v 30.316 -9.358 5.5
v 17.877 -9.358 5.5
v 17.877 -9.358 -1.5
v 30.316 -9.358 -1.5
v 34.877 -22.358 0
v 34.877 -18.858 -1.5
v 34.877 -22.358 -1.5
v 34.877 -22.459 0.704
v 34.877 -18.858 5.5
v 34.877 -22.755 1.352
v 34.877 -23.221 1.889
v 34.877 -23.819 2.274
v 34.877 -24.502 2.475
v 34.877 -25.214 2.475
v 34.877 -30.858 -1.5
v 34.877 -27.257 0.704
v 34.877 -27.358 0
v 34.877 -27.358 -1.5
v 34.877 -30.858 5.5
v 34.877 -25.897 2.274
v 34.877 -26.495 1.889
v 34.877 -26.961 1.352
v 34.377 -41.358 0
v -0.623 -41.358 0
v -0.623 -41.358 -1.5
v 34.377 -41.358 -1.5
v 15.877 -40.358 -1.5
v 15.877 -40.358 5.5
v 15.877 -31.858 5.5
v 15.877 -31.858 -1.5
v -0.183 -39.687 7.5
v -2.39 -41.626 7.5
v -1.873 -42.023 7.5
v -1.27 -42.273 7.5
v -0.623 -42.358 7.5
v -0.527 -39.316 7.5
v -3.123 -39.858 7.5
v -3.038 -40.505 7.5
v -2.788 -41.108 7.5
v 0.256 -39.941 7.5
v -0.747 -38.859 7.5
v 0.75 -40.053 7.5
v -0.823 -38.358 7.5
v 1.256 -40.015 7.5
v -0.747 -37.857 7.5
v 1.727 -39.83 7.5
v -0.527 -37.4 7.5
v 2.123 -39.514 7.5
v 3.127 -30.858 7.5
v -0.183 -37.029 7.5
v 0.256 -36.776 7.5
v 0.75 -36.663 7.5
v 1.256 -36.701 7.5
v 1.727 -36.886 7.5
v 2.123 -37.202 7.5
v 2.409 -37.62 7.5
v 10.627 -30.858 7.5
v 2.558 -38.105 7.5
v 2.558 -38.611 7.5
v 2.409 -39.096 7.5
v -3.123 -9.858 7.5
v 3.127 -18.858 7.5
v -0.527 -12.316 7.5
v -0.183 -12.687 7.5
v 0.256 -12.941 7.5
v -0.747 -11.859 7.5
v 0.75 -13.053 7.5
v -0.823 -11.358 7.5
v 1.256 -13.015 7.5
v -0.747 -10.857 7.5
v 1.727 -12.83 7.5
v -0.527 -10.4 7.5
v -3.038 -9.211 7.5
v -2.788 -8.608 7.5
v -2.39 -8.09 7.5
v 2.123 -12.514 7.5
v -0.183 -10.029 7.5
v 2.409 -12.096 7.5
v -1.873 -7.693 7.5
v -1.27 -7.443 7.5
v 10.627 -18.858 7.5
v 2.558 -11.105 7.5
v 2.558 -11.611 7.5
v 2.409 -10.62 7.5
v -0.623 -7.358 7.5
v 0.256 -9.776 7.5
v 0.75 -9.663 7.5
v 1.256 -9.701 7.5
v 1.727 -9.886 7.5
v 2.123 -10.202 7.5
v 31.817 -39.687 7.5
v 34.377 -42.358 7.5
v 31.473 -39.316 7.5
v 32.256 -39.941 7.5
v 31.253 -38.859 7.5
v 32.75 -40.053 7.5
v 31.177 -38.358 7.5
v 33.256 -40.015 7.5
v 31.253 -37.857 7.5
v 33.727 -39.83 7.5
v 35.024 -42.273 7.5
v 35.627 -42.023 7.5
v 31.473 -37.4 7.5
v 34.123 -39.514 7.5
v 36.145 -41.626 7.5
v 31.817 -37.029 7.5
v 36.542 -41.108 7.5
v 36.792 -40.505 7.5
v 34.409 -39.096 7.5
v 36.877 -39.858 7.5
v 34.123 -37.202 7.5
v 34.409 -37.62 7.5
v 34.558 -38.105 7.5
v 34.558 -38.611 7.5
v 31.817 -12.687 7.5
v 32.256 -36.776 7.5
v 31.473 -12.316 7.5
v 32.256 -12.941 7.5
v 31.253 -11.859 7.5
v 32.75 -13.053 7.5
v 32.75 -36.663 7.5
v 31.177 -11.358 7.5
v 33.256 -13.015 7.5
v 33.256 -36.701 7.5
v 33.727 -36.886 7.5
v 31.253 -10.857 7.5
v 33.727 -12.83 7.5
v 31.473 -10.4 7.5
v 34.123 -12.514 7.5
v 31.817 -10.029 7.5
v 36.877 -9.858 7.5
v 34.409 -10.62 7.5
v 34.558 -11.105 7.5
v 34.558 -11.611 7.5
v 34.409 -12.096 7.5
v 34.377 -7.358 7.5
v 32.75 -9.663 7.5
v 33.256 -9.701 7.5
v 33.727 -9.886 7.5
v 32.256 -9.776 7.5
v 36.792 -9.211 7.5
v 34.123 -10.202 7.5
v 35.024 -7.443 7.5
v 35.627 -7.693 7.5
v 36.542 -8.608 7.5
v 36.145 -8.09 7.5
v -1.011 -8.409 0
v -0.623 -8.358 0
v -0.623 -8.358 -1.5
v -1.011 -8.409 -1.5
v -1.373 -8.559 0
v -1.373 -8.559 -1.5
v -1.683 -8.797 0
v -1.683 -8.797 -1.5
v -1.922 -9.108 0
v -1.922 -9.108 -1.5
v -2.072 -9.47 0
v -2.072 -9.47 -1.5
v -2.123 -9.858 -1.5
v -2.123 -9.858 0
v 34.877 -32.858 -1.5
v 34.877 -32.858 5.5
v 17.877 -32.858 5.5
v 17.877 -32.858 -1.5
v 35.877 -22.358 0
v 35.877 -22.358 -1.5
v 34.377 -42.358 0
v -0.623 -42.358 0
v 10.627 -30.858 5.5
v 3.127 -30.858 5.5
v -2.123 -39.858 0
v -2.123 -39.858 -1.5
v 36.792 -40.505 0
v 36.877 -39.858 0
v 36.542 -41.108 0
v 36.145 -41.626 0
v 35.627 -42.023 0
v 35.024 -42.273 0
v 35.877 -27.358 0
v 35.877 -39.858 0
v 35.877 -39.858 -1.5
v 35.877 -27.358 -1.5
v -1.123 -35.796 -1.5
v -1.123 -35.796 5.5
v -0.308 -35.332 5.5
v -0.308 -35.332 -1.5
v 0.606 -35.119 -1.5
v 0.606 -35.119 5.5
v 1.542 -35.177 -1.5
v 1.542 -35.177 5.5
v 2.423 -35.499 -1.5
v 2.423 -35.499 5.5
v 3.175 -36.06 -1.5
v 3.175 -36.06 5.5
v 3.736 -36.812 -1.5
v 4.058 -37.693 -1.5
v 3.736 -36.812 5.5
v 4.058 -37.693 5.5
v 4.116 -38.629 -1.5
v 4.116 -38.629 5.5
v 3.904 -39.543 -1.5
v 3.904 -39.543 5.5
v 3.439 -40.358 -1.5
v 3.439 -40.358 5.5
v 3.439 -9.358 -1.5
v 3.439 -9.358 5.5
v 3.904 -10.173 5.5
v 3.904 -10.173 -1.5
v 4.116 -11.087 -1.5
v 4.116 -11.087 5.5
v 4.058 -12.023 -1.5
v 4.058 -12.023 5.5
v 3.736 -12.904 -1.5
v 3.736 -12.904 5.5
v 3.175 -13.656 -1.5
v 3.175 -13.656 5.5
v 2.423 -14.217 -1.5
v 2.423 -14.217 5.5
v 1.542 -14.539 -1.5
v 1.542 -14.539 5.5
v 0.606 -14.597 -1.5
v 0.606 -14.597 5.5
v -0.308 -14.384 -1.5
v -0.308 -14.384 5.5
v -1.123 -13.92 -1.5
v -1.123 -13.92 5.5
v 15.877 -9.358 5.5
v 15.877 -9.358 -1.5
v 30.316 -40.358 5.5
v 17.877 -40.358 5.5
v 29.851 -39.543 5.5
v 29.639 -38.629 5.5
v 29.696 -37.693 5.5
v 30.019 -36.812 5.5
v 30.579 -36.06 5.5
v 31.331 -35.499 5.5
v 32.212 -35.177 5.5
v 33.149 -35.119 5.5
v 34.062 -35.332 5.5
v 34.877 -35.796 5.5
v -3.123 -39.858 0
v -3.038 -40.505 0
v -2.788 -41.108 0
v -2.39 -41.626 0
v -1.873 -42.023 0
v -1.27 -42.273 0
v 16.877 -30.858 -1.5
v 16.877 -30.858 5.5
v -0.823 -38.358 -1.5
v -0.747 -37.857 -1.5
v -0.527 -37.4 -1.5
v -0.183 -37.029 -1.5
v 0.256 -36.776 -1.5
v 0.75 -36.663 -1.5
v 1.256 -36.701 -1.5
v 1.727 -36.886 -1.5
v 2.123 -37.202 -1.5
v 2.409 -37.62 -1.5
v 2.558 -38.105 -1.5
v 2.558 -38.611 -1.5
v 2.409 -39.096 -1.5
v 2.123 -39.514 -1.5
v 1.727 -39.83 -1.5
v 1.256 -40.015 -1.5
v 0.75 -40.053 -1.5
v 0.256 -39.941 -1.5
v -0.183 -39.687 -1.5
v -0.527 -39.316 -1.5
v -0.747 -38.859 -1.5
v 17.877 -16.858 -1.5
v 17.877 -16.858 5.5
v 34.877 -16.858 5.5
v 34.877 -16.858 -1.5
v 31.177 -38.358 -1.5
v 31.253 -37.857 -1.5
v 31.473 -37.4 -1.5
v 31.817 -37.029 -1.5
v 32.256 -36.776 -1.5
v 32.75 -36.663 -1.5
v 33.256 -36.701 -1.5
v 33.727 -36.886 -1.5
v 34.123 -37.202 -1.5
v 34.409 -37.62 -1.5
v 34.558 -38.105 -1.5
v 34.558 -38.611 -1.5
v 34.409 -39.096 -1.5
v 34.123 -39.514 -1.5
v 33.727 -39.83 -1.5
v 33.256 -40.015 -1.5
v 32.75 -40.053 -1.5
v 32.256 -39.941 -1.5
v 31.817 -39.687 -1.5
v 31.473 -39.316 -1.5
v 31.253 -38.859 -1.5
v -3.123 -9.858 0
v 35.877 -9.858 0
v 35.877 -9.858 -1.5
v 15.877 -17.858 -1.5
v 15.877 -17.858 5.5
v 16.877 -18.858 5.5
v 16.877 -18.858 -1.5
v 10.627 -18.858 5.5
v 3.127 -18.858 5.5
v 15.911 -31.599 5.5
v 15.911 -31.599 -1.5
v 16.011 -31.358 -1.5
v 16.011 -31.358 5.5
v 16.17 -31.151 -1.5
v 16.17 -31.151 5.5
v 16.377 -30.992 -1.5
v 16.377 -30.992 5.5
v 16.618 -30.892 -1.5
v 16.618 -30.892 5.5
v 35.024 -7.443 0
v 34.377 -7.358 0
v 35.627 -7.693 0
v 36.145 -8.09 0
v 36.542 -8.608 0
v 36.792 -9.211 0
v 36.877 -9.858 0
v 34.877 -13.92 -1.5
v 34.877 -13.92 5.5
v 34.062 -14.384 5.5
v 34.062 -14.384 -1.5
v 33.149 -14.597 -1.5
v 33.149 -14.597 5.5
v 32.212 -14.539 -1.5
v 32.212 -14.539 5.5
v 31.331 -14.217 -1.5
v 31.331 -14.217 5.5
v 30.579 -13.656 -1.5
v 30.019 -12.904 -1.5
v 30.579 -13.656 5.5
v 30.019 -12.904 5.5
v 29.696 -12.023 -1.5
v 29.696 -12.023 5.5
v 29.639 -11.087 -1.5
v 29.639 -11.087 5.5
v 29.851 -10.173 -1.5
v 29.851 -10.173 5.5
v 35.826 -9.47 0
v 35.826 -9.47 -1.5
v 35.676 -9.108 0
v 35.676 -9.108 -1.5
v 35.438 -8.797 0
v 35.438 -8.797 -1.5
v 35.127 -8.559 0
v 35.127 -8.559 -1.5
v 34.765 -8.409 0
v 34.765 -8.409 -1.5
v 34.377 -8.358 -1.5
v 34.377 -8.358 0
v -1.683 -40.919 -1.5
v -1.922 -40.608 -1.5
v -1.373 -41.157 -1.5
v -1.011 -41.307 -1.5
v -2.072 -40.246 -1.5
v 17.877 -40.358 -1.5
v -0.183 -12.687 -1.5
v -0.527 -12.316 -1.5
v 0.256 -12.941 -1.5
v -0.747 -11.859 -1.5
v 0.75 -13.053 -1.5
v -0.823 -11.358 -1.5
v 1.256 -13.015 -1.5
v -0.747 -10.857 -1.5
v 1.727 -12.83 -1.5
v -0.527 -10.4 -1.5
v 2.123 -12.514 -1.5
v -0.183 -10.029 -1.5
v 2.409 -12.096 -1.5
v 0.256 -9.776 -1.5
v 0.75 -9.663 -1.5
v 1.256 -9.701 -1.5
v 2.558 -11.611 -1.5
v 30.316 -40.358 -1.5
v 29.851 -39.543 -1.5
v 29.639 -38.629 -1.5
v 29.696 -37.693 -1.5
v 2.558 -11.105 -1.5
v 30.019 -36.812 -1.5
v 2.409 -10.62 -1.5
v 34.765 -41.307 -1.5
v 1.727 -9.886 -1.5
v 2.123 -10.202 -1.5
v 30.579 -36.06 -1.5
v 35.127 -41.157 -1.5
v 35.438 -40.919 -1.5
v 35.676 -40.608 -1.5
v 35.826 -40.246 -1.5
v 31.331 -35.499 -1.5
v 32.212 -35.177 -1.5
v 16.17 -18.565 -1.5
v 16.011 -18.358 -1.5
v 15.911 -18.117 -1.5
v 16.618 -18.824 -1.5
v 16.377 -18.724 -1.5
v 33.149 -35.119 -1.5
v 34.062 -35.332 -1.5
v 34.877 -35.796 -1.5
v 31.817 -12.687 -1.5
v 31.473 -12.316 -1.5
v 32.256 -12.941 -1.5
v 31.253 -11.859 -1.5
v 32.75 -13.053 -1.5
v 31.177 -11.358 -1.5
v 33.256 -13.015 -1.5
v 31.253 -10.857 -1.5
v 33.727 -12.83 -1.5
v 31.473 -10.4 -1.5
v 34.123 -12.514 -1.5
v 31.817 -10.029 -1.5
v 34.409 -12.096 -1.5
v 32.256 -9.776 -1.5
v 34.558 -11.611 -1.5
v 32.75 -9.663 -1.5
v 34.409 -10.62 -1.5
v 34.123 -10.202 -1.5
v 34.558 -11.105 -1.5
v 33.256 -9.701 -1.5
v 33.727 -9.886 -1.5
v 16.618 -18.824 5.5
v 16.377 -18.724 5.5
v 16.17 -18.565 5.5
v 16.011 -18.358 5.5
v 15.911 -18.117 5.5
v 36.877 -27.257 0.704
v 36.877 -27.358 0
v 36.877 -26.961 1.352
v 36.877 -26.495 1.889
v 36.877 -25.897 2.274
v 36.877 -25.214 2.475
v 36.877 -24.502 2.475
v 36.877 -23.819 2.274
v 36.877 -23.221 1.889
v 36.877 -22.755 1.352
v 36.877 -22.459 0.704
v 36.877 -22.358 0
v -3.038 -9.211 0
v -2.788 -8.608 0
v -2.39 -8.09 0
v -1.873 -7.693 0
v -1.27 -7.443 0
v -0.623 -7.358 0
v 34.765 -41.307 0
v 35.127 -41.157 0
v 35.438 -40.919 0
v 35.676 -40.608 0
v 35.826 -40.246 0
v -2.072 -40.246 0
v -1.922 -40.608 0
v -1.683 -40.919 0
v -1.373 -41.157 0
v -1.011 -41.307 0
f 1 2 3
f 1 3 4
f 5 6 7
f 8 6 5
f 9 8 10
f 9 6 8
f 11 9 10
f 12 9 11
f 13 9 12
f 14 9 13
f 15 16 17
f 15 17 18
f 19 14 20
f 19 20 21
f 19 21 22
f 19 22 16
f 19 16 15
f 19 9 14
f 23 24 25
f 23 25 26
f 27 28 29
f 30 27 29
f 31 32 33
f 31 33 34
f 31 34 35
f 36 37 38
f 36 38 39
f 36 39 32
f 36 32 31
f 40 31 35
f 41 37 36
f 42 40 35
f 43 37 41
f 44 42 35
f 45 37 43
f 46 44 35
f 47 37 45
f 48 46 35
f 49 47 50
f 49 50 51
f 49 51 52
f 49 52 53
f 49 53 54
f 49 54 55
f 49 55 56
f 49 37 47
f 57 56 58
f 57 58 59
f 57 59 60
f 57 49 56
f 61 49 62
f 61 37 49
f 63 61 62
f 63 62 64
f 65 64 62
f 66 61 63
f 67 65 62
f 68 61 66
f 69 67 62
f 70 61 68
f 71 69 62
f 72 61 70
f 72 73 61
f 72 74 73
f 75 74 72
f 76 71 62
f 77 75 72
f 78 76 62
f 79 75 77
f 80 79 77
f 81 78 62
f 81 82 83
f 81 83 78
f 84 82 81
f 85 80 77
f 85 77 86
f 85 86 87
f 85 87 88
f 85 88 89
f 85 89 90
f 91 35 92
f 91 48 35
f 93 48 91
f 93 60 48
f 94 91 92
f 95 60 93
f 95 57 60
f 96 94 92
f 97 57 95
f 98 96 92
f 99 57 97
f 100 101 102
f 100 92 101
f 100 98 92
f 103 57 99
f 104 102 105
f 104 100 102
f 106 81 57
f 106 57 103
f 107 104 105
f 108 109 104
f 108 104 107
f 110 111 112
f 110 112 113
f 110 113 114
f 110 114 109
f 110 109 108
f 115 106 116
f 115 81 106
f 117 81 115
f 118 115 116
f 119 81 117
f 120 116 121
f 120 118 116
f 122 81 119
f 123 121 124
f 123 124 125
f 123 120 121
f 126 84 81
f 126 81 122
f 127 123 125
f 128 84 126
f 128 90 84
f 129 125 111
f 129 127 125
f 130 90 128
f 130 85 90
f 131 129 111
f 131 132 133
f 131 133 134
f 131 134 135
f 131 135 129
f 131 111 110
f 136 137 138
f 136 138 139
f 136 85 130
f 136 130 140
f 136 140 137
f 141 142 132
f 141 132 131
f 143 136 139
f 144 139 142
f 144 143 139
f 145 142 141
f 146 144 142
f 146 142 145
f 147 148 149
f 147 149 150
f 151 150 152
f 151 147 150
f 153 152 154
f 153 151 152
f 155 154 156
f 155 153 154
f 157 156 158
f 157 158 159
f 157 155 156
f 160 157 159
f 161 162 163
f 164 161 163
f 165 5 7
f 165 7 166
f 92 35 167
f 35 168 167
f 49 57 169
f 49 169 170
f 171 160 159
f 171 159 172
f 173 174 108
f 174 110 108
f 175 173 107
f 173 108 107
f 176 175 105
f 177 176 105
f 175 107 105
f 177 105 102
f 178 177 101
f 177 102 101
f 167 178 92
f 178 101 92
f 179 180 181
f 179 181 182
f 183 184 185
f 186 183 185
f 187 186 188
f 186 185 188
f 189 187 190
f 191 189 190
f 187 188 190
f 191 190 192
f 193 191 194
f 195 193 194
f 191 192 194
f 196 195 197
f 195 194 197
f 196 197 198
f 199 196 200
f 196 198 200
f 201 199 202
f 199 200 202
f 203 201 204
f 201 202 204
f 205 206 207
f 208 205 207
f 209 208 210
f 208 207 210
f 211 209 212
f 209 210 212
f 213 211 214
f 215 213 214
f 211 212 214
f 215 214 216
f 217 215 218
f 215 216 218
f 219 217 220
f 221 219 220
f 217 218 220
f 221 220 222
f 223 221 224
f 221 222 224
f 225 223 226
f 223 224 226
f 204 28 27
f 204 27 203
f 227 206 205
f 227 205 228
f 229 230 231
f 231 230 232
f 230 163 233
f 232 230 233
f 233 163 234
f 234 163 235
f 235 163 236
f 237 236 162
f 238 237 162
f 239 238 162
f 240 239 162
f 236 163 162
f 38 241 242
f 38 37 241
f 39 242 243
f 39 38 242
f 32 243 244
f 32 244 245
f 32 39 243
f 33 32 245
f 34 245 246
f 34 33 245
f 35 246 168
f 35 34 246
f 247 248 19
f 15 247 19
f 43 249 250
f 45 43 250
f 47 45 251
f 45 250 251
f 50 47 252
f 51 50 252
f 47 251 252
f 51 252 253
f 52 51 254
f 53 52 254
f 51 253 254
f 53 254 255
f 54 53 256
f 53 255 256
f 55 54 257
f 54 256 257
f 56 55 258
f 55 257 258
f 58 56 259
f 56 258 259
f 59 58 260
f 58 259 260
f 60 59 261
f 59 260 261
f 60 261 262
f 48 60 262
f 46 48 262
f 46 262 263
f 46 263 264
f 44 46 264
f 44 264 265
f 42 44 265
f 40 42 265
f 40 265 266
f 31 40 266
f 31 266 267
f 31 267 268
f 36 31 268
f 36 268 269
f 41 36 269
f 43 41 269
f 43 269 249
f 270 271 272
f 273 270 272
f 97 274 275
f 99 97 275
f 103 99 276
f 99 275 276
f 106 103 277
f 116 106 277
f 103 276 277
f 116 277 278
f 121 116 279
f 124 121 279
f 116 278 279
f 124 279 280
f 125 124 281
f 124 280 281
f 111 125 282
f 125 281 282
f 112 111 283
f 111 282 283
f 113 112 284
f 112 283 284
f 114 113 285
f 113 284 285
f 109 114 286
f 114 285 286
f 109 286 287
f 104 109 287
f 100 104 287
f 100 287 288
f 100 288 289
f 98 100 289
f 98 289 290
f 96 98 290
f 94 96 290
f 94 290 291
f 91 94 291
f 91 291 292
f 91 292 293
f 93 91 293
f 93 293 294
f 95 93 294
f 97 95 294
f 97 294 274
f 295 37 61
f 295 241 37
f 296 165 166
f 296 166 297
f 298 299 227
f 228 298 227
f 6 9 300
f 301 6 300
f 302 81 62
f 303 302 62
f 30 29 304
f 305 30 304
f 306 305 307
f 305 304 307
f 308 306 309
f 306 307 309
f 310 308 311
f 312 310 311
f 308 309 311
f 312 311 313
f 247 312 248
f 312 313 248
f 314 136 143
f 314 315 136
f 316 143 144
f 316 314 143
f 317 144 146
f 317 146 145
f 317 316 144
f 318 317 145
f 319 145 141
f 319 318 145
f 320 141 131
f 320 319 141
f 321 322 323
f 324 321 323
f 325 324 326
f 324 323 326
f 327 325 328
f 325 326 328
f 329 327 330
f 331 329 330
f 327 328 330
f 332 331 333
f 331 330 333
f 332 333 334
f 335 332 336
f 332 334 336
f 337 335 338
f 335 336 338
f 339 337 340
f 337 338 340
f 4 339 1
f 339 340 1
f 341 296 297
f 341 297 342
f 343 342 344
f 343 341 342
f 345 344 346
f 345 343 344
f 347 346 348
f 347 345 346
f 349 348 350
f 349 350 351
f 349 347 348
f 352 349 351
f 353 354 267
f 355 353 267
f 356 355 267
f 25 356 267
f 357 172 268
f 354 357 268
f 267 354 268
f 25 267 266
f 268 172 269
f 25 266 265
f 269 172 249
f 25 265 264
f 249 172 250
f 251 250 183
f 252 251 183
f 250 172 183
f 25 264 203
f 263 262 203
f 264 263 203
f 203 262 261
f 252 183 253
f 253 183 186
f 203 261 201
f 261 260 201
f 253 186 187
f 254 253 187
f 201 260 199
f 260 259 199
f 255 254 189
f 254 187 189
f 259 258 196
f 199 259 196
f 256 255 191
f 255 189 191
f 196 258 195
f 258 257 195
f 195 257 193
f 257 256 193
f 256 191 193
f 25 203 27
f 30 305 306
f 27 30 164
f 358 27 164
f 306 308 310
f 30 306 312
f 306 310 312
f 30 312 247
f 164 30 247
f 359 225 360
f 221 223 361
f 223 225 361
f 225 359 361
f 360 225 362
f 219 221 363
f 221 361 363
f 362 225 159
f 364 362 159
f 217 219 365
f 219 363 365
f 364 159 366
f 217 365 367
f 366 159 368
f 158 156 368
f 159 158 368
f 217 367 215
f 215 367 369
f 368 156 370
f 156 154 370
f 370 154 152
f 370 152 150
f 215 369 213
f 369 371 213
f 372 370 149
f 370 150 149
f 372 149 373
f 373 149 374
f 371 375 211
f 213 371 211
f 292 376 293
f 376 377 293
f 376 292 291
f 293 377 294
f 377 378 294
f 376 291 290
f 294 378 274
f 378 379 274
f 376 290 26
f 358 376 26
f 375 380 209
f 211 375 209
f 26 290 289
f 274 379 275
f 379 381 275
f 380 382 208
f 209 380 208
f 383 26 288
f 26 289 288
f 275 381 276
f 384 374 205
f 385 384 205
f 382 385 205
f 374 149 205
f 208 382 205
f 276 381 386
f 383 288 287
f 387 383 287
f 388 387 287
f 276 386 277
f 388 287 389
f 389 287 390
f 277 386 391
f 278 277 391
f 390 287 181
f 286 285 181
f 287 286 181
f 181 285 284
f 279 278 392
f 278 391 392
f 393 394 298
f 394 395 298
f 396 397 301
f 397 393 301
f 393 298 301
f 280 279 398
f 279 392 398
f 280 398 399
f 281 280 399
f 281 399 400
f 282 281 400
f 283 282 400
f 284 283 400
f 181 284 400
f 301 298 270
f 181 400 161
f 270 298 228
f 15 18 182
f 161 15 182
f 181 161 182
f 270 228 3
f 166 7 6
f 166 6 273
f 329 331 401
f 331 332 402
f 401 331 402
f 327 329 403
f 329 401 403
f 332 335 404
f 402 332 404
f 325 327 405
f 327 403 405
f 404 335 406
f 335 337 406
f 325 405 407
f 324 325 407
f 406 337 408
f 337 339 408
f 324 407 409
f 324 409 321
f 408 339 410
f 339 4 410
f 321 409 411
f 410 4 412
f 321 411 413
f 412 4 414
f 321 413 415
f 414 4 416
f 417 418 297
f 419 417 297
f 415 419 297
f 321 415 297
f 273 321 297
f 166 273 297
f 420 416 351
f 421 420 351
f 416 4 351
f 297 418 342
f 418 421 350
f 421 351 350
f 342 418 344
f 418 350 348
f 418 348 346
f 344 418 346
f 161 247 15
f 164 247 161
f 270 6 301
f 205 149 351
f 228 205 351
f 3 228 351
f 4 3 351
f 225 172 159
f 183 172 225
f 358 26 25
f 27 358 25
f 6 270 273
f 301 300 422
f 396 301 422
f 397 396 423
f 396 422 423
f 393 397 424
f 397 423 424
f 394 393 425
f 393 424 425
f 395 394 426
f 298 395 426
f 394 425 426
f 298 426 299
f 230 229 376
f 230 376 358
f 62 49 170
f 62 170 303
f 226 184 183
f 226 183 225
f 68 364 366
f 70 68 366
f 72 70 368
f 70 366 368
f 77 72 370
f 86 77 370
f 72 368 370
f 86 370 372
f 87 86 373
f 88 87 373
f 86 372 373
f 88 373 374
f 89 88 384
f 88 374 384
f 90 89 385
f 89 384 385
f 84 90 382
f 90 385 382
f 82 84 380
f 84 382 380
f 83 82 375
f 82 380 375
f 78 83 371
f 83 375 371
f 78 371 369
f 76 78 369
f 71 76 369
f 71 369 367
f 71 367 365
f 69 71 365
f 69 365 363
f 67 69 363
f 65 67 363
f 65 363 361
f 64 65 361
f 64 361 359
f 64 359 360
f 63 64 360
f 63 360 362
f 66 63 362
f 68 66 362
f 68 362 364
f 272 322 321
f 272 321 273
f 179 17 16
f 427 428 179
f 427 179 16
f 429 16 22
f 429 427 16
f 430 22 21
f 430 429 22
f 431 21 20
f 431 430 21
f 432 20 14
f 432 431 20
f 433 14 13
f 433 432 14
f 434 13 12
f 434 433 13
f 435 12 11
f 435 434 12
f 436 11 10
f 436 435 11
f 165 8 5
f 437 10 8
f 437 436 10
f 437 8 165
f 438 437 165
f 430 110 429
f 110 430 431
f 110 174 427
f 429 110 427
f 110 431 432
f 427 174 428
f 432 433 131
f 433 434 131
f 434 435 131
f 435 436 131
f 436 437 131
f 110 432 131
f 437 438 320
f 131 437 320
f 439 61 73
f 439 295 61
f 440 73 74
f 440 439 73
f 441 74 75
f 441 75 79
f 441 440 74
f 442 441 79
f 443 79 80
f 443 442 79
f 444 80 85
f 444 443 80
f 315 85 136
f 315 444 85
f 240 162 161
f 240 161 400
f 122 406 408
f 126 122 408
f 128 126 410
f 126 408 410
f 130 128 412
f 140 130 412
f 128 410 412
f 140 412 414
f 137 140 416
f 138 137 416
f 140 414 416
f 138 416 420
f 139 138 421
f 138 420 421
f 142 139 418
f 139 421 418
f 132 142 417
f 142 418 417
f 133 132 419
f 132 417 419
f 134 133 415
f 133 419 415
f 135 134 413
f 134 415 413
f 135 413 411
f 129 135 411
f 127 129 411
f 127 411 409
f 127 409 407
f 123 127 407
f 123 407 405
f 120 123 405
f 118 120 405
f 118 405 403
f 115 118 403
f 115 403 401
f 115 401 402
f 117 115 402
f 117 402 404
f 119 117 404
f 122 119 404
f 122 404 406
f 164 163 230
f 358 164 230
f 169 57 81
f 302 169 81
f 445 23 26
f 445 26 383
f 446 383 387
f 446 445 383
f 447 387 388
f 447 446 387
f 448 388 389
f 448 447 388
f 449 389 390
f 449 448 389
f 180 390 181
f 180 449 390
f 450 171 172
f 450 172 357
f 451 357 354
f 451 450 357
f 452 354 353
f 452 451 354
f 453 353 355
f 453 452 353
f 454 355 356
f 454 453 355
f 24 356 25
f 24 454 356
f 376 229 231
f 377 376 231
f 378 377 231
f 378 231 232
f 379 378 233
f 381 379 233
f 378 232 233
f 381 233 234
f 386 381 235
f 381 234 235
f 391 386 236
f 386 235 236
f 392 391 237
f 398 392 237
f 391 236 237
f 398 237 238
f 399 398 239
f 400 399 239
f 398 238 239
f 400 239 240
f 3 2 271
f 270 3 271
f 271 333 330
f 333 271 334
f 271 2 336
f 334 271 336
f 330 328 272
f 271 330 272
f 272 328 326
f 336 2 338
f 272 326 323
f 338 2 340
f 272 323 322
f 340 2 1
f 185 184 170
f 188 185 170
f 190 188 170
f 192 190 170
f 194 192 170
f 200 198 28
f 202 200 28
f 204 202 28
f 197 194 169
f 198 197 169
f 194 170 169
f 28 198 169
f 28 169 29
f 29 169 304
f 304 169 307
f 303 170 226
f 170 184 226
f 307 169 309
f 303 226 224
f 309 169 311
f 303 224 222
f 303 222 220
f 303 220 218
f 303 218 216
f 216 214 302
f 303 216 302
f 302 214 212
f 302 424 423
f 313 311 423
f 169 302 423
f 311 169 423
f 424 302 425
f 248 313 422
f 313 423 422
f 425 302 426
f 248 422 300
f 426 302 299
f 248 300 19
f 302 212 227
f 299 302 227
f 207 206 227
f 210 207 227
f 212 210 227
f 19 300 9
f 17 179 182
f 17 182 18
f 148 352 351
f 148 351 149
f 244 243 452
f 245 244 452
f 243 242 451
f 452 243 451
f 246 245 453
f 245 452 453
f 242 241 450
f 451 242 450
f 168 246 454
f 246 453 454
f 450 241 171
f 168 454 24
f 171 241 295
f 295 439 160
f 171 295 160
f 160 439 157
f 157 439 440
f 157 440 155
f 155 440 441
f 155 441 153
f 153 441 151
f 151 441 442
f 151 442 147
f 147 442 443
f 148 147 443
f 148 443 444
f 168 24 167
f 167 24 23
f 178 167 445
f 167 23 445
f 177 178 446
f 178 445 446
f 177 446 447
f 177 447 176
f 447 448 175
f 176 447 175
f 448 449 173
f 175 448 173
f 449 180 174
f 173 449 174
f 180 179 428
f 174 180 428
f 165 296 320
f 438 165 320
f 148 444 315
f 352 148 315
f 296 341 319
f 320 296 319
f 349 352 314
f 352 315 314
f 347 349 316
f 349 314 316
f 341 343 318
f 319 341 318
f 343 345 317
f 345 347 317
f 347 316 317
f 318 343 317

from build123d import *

# Parameters (mm, degrees)
ESQUISSE1_W             = 40
ESQUISSE1_H             = 35
ESQUISSE1_W_2           = 36
ESQUISSE1_H_2           = 31
BOSS_EXTRU_1_DEPTH      = 5.5
ESQUISSE2_W             = 40
ESQUISSE2_H             = 35
BOSS_EXTRU_2_DEPTH      = 2
ENL_V_MAT_EXTRU_1_REACH = 42
BOSS_EXTRU_3_DEPTH      = 7
ENL_V_MAT_EXTRU_2_REACH = 11
ESQUISSE9_W             = 7.5
ESQUISSE9_H             = 12
D_GAGEMENT_M31_D        = 3.4
CONG_1_R                = 2.5
BOSS_EXTRU_6_DEPTH      = 1.5


with BuildPart() as part:
    # Esquisse1 → Boss.-Extru.1 (new body)
    with BuildSketch(Plane.XY):
        with Locations((16.877269095, -24.858015503)):
            Rectangle(ESQUISSE1_W, ESQUISSE1_H)
        with Locations((16.877269095, -24.858015503)):
            Rectangle(ESQUISSE1_W_2, ESQUISSE1_H_2, mode=Mode.SUBTRACT)
    extrude(amount=BOSS_EXTRU_1_DEPTH)

    # Esquisse2 → Boss.-Extru.2 (add)
    with BuildSketch(Plane.XY.offset(5.5)):
        with Locations((16.877269095, -24.858015503)):
            Rectangle(ESQUISSE2_W, ESQUISSE2_H)
    extrude(amount=BOSS_EXTRU_2_DEPTH)

    # Esquisse3 → Enlèv. mat.-Extru.1 (cut, up to next)
    with BuildSketch(Plane(origin=(36.877269095, 0, 0), x_dir=(0, 0, -1), z_dir=(1, 0, 0)), mode=Mode.PRIVATE) as enl_v_mat_extru_1_sk1:
        with BuildLine():
            Line((0, -22.358015503), (0, -27.358015503))
            ThreePointArc((0, -27.358015503), (-2.5, -24.858015503), (0, -22.358015503))
        make_face()
    enl_v_mat_extru_1_tool1 = extrude(enl_v_mat_extru_1_sk1.sketch, amount=-ENL_V_MAT_EXTRU_1_REACH, mode=Mode.PRIVATE) & part.part
    add(enl_v_mat_extru_1_tool1.solids().sort_by_distance((36.877269, -24.858016, 1.061033))[0], mode=Mode.SUBTRACT)

    # Esquisse4 → Boss.-Extru.3 (add)
    with BuildSketch(Plane(origin=(0, 0, 5.5), x_dir=(-1, 0, 0), z_dir=(0, 0, -1))):
        with BuildLine():
            ThreePointArc((-34.877269095, -13.919753195), (-30.579172056, -13.656112542), (-30.315531404, -9.358015503))
            Line((-30.315531404, -9.358015503), (-34.877269095, -9.358015503))
            Line((-34.877269095, -9.358015503), (-34.877269095, -13.919753195))
        make_face()
        with BuildLine():
            Line((-34.877269095, -32.858015503), (-17.877269095, -32.858015503))
            Line((-17.877269095, -32.858015503), (-17.877269095, -40.358015503))
            Line((-17.877269095, -40.358015503), (-15.877269095, -40.358015503))
            Line((-15.877269095, -40.358015503), (-15.877269095, -31.858015503))
            ThreePointArc((-15.877269095, -31.858015503), (-16.170162314, -31.150908722), (-16.877269095, -30.858015503))
            Line((-16.877269095, -30.858015503), (-34.877269095, -30.858015503))
            Line((-34.877269095, -30.858015503), (-34.877269095, -32.858015503))
        make_face()
        with BuildLine():
            Line((-34.877269095, -35.796277812), (-34.877269095, -40.358015503))
            Line((-34.877269095, -40.358015503), (-30.315531404, -40.358015503))
            ThreePointArc((-30.315531404, -40.358015503), (-30.579172056, -36.059918465), (-34.877269095, -35.796277812))
        make_face()
        with BuildLine():
            Line((-17.877269095, -16.858015503), (-34.877269095, -16.858015503))
            Line((-34.877269095, -16.858015503), (-34.877269095, -18.858015503))
            Line((-34.877269095, -18.858015503), (-16.877269095, -18.858015503))
            ThreePointArc((-16.877269095, -18.858015503), (-16.170162314, -18.565122285), (-15.877269095, -17.858015503))
            Line((-15.877269095, -17.858015503), (-15.877269095, -9.358015503))
            Line((-15.877269095, -9.358015503), (-17.877269095, -9.358015503))
            Line((-17.877269095, -9.358015503), (-17.877269095, -16.858015503))
        make_face()
        with BuildLine():
            Line((-3.439006787, -40.358015503), (1.122730905, -40.358015503))
            Line((1.122730905, -40.358015503), (1.122730905, -35.796277812))
            ThreePointArc((1.122730905, -35.796277812), (-3.175366134, -36.059918465), (-3.439006787, -40.358015503))
        make_face()
        with BuildLine():
            Line((1.122730905, -13.919753195), (1.122730905, -9.358015503))
            Line((1.122730905, -9.358015503), (-3.439006787, -9.358015503))
            ThreePointArc((-3.439006787, -9.358015503), (-3.175366134, -13.656112542), (1.122730905, -13.919753195))
        make_face()
    extrude(amount=BOSS_EXTRU_3_DEPTH)

    # Esquisse9 → Enlèv. mat.-Extru.2 (cut, up to next)
    with BuildSketch(Plane(origin=(6.5, 0, 7.5), x_dir=(-1, 0, 0), z_dir=(0, 0, -1)), mode=Mode.PRIVATE) as enl_v_mat_extru_2_sk1:
        with Locations((-0.377269095, -24.858015503)):
            Rectangle(ESQUISSE9_W, ESQUISSE9_H)
    enl_v_mat_extru_2_tool1 = extrude(enl_v_mat_extru_2_sk1.sketch, amount=ENL_V_MAT_EXTRU_2_REACH, mode=Mode.PRIVATE) & part.part
    add(enl_v_mat_extru_2_tool1.solids().sort_by_distance((6.877269, -24.858016, 7.5))[0], mode=Mode.SUBTRACT)

    # Dégagement M31 (through all)
    with Locations(Plane.XY.offset(7.5)):
        with Locations((0.877269095, -11.358015503), (32.877269095, -38.358015503), (32.877269095, -11.358015503), (0.877269095, -38.358015503)):
            Hole(D_GAGEMENT_M31_D / 2)

    # Congé1
    cong_1_edges = [part.edges().sort_by_distance(p)[0] for p in [
        (-3.122730905, -7.358015503, 3.75),
        (36.877269095, -7.358015503, 3.75),
        (36.877269095, -42.358015503, 3.75),
        (-3.122730905, -42.358015503, 3.75),
    ]]
    fillet(cong_1_edges, radius=CONG_1_R)

    # Esquisse13 → Boss.-Extru.6 (add)
    with BuildSketch(Plane(origin=(0, 0, 0), x_dir=(-1, 0, 0), z_dir=(0, 0, -1))):
        with BuildLine():
            Line((-35.877269095, -27.358015503), (-34.877269095, -27.358015503))
            Line((-34.877269095, -27.358015503), (-34.877269095, -39.858015503))
            ThreePointArc((-34.877269095, -39.858015503), (-34.730822486, -40.211568894), (-34.377269095, -40.358015503))
            Line((-34.377269095, -40.358015503), (0.622730905, -40.358015503))
            ThreePointArc((0.622730905, -40.358015503), (0.976284295, -40.211568894), (1.122730905, -39.858015503))
            Line((1.122730905, -39.858015503), (1.122730905, -9.861767147))
            ThreePointArc((1.122730905, -9.861767147), (0.975185464, -9.505560944), (0.618979261, -9.358015503))
            Line((0.618979261, -9.358015503), (-34.377269095, -9.358015503))
            ThreePointArc((-34.377269095, -9.358015503), (-34.730822486, -9.504462113), (-34.877269095, -9.858015503))
            Line((-34.877269095, -9.858015503), (-34.877269095, -22.358015503))
            Line((-34.877269095, -22.358015503), (-35.877269095, -22.358015503))
            Line((-35.877269095, -22.358015503), (-35.877269095, -9.858015503))
            ThreePointArc((-35.877269095, -9.858015503), (-35.437929267, -8.797355332), (-34.377269095, -8.358015503))
            Line((-34.377269095, -8.358015503), (0.622730905, -8.358015503))
            ThreePointArc((0.622730905, -8.358015503), (1.683391077, -8.797355332), (2.122730905, -9.858015503))
            Line((2.122730905, -9.858015503), (2.122730905, -39.858015503))
            ThreePointArc((2.122730905, -39.858015503), (1.683391077, -40.918675675), (0.622730905, -41.358015503))
            Line((0.622730905, -41.358015503), (-34.377269095, -41.358015503))
            ThreePointArc((-34.377269095, -41.358015503), (-35.437929267, -40.918675675), (-35.877269095, -39.858015503))
            Line((-35.877269095, -39.858015503), (-35.877269095, -27.358015503))
        make_face()
    extrude(amount=BOSS_EXTRU_6_DEPTH)


solid = part.part
